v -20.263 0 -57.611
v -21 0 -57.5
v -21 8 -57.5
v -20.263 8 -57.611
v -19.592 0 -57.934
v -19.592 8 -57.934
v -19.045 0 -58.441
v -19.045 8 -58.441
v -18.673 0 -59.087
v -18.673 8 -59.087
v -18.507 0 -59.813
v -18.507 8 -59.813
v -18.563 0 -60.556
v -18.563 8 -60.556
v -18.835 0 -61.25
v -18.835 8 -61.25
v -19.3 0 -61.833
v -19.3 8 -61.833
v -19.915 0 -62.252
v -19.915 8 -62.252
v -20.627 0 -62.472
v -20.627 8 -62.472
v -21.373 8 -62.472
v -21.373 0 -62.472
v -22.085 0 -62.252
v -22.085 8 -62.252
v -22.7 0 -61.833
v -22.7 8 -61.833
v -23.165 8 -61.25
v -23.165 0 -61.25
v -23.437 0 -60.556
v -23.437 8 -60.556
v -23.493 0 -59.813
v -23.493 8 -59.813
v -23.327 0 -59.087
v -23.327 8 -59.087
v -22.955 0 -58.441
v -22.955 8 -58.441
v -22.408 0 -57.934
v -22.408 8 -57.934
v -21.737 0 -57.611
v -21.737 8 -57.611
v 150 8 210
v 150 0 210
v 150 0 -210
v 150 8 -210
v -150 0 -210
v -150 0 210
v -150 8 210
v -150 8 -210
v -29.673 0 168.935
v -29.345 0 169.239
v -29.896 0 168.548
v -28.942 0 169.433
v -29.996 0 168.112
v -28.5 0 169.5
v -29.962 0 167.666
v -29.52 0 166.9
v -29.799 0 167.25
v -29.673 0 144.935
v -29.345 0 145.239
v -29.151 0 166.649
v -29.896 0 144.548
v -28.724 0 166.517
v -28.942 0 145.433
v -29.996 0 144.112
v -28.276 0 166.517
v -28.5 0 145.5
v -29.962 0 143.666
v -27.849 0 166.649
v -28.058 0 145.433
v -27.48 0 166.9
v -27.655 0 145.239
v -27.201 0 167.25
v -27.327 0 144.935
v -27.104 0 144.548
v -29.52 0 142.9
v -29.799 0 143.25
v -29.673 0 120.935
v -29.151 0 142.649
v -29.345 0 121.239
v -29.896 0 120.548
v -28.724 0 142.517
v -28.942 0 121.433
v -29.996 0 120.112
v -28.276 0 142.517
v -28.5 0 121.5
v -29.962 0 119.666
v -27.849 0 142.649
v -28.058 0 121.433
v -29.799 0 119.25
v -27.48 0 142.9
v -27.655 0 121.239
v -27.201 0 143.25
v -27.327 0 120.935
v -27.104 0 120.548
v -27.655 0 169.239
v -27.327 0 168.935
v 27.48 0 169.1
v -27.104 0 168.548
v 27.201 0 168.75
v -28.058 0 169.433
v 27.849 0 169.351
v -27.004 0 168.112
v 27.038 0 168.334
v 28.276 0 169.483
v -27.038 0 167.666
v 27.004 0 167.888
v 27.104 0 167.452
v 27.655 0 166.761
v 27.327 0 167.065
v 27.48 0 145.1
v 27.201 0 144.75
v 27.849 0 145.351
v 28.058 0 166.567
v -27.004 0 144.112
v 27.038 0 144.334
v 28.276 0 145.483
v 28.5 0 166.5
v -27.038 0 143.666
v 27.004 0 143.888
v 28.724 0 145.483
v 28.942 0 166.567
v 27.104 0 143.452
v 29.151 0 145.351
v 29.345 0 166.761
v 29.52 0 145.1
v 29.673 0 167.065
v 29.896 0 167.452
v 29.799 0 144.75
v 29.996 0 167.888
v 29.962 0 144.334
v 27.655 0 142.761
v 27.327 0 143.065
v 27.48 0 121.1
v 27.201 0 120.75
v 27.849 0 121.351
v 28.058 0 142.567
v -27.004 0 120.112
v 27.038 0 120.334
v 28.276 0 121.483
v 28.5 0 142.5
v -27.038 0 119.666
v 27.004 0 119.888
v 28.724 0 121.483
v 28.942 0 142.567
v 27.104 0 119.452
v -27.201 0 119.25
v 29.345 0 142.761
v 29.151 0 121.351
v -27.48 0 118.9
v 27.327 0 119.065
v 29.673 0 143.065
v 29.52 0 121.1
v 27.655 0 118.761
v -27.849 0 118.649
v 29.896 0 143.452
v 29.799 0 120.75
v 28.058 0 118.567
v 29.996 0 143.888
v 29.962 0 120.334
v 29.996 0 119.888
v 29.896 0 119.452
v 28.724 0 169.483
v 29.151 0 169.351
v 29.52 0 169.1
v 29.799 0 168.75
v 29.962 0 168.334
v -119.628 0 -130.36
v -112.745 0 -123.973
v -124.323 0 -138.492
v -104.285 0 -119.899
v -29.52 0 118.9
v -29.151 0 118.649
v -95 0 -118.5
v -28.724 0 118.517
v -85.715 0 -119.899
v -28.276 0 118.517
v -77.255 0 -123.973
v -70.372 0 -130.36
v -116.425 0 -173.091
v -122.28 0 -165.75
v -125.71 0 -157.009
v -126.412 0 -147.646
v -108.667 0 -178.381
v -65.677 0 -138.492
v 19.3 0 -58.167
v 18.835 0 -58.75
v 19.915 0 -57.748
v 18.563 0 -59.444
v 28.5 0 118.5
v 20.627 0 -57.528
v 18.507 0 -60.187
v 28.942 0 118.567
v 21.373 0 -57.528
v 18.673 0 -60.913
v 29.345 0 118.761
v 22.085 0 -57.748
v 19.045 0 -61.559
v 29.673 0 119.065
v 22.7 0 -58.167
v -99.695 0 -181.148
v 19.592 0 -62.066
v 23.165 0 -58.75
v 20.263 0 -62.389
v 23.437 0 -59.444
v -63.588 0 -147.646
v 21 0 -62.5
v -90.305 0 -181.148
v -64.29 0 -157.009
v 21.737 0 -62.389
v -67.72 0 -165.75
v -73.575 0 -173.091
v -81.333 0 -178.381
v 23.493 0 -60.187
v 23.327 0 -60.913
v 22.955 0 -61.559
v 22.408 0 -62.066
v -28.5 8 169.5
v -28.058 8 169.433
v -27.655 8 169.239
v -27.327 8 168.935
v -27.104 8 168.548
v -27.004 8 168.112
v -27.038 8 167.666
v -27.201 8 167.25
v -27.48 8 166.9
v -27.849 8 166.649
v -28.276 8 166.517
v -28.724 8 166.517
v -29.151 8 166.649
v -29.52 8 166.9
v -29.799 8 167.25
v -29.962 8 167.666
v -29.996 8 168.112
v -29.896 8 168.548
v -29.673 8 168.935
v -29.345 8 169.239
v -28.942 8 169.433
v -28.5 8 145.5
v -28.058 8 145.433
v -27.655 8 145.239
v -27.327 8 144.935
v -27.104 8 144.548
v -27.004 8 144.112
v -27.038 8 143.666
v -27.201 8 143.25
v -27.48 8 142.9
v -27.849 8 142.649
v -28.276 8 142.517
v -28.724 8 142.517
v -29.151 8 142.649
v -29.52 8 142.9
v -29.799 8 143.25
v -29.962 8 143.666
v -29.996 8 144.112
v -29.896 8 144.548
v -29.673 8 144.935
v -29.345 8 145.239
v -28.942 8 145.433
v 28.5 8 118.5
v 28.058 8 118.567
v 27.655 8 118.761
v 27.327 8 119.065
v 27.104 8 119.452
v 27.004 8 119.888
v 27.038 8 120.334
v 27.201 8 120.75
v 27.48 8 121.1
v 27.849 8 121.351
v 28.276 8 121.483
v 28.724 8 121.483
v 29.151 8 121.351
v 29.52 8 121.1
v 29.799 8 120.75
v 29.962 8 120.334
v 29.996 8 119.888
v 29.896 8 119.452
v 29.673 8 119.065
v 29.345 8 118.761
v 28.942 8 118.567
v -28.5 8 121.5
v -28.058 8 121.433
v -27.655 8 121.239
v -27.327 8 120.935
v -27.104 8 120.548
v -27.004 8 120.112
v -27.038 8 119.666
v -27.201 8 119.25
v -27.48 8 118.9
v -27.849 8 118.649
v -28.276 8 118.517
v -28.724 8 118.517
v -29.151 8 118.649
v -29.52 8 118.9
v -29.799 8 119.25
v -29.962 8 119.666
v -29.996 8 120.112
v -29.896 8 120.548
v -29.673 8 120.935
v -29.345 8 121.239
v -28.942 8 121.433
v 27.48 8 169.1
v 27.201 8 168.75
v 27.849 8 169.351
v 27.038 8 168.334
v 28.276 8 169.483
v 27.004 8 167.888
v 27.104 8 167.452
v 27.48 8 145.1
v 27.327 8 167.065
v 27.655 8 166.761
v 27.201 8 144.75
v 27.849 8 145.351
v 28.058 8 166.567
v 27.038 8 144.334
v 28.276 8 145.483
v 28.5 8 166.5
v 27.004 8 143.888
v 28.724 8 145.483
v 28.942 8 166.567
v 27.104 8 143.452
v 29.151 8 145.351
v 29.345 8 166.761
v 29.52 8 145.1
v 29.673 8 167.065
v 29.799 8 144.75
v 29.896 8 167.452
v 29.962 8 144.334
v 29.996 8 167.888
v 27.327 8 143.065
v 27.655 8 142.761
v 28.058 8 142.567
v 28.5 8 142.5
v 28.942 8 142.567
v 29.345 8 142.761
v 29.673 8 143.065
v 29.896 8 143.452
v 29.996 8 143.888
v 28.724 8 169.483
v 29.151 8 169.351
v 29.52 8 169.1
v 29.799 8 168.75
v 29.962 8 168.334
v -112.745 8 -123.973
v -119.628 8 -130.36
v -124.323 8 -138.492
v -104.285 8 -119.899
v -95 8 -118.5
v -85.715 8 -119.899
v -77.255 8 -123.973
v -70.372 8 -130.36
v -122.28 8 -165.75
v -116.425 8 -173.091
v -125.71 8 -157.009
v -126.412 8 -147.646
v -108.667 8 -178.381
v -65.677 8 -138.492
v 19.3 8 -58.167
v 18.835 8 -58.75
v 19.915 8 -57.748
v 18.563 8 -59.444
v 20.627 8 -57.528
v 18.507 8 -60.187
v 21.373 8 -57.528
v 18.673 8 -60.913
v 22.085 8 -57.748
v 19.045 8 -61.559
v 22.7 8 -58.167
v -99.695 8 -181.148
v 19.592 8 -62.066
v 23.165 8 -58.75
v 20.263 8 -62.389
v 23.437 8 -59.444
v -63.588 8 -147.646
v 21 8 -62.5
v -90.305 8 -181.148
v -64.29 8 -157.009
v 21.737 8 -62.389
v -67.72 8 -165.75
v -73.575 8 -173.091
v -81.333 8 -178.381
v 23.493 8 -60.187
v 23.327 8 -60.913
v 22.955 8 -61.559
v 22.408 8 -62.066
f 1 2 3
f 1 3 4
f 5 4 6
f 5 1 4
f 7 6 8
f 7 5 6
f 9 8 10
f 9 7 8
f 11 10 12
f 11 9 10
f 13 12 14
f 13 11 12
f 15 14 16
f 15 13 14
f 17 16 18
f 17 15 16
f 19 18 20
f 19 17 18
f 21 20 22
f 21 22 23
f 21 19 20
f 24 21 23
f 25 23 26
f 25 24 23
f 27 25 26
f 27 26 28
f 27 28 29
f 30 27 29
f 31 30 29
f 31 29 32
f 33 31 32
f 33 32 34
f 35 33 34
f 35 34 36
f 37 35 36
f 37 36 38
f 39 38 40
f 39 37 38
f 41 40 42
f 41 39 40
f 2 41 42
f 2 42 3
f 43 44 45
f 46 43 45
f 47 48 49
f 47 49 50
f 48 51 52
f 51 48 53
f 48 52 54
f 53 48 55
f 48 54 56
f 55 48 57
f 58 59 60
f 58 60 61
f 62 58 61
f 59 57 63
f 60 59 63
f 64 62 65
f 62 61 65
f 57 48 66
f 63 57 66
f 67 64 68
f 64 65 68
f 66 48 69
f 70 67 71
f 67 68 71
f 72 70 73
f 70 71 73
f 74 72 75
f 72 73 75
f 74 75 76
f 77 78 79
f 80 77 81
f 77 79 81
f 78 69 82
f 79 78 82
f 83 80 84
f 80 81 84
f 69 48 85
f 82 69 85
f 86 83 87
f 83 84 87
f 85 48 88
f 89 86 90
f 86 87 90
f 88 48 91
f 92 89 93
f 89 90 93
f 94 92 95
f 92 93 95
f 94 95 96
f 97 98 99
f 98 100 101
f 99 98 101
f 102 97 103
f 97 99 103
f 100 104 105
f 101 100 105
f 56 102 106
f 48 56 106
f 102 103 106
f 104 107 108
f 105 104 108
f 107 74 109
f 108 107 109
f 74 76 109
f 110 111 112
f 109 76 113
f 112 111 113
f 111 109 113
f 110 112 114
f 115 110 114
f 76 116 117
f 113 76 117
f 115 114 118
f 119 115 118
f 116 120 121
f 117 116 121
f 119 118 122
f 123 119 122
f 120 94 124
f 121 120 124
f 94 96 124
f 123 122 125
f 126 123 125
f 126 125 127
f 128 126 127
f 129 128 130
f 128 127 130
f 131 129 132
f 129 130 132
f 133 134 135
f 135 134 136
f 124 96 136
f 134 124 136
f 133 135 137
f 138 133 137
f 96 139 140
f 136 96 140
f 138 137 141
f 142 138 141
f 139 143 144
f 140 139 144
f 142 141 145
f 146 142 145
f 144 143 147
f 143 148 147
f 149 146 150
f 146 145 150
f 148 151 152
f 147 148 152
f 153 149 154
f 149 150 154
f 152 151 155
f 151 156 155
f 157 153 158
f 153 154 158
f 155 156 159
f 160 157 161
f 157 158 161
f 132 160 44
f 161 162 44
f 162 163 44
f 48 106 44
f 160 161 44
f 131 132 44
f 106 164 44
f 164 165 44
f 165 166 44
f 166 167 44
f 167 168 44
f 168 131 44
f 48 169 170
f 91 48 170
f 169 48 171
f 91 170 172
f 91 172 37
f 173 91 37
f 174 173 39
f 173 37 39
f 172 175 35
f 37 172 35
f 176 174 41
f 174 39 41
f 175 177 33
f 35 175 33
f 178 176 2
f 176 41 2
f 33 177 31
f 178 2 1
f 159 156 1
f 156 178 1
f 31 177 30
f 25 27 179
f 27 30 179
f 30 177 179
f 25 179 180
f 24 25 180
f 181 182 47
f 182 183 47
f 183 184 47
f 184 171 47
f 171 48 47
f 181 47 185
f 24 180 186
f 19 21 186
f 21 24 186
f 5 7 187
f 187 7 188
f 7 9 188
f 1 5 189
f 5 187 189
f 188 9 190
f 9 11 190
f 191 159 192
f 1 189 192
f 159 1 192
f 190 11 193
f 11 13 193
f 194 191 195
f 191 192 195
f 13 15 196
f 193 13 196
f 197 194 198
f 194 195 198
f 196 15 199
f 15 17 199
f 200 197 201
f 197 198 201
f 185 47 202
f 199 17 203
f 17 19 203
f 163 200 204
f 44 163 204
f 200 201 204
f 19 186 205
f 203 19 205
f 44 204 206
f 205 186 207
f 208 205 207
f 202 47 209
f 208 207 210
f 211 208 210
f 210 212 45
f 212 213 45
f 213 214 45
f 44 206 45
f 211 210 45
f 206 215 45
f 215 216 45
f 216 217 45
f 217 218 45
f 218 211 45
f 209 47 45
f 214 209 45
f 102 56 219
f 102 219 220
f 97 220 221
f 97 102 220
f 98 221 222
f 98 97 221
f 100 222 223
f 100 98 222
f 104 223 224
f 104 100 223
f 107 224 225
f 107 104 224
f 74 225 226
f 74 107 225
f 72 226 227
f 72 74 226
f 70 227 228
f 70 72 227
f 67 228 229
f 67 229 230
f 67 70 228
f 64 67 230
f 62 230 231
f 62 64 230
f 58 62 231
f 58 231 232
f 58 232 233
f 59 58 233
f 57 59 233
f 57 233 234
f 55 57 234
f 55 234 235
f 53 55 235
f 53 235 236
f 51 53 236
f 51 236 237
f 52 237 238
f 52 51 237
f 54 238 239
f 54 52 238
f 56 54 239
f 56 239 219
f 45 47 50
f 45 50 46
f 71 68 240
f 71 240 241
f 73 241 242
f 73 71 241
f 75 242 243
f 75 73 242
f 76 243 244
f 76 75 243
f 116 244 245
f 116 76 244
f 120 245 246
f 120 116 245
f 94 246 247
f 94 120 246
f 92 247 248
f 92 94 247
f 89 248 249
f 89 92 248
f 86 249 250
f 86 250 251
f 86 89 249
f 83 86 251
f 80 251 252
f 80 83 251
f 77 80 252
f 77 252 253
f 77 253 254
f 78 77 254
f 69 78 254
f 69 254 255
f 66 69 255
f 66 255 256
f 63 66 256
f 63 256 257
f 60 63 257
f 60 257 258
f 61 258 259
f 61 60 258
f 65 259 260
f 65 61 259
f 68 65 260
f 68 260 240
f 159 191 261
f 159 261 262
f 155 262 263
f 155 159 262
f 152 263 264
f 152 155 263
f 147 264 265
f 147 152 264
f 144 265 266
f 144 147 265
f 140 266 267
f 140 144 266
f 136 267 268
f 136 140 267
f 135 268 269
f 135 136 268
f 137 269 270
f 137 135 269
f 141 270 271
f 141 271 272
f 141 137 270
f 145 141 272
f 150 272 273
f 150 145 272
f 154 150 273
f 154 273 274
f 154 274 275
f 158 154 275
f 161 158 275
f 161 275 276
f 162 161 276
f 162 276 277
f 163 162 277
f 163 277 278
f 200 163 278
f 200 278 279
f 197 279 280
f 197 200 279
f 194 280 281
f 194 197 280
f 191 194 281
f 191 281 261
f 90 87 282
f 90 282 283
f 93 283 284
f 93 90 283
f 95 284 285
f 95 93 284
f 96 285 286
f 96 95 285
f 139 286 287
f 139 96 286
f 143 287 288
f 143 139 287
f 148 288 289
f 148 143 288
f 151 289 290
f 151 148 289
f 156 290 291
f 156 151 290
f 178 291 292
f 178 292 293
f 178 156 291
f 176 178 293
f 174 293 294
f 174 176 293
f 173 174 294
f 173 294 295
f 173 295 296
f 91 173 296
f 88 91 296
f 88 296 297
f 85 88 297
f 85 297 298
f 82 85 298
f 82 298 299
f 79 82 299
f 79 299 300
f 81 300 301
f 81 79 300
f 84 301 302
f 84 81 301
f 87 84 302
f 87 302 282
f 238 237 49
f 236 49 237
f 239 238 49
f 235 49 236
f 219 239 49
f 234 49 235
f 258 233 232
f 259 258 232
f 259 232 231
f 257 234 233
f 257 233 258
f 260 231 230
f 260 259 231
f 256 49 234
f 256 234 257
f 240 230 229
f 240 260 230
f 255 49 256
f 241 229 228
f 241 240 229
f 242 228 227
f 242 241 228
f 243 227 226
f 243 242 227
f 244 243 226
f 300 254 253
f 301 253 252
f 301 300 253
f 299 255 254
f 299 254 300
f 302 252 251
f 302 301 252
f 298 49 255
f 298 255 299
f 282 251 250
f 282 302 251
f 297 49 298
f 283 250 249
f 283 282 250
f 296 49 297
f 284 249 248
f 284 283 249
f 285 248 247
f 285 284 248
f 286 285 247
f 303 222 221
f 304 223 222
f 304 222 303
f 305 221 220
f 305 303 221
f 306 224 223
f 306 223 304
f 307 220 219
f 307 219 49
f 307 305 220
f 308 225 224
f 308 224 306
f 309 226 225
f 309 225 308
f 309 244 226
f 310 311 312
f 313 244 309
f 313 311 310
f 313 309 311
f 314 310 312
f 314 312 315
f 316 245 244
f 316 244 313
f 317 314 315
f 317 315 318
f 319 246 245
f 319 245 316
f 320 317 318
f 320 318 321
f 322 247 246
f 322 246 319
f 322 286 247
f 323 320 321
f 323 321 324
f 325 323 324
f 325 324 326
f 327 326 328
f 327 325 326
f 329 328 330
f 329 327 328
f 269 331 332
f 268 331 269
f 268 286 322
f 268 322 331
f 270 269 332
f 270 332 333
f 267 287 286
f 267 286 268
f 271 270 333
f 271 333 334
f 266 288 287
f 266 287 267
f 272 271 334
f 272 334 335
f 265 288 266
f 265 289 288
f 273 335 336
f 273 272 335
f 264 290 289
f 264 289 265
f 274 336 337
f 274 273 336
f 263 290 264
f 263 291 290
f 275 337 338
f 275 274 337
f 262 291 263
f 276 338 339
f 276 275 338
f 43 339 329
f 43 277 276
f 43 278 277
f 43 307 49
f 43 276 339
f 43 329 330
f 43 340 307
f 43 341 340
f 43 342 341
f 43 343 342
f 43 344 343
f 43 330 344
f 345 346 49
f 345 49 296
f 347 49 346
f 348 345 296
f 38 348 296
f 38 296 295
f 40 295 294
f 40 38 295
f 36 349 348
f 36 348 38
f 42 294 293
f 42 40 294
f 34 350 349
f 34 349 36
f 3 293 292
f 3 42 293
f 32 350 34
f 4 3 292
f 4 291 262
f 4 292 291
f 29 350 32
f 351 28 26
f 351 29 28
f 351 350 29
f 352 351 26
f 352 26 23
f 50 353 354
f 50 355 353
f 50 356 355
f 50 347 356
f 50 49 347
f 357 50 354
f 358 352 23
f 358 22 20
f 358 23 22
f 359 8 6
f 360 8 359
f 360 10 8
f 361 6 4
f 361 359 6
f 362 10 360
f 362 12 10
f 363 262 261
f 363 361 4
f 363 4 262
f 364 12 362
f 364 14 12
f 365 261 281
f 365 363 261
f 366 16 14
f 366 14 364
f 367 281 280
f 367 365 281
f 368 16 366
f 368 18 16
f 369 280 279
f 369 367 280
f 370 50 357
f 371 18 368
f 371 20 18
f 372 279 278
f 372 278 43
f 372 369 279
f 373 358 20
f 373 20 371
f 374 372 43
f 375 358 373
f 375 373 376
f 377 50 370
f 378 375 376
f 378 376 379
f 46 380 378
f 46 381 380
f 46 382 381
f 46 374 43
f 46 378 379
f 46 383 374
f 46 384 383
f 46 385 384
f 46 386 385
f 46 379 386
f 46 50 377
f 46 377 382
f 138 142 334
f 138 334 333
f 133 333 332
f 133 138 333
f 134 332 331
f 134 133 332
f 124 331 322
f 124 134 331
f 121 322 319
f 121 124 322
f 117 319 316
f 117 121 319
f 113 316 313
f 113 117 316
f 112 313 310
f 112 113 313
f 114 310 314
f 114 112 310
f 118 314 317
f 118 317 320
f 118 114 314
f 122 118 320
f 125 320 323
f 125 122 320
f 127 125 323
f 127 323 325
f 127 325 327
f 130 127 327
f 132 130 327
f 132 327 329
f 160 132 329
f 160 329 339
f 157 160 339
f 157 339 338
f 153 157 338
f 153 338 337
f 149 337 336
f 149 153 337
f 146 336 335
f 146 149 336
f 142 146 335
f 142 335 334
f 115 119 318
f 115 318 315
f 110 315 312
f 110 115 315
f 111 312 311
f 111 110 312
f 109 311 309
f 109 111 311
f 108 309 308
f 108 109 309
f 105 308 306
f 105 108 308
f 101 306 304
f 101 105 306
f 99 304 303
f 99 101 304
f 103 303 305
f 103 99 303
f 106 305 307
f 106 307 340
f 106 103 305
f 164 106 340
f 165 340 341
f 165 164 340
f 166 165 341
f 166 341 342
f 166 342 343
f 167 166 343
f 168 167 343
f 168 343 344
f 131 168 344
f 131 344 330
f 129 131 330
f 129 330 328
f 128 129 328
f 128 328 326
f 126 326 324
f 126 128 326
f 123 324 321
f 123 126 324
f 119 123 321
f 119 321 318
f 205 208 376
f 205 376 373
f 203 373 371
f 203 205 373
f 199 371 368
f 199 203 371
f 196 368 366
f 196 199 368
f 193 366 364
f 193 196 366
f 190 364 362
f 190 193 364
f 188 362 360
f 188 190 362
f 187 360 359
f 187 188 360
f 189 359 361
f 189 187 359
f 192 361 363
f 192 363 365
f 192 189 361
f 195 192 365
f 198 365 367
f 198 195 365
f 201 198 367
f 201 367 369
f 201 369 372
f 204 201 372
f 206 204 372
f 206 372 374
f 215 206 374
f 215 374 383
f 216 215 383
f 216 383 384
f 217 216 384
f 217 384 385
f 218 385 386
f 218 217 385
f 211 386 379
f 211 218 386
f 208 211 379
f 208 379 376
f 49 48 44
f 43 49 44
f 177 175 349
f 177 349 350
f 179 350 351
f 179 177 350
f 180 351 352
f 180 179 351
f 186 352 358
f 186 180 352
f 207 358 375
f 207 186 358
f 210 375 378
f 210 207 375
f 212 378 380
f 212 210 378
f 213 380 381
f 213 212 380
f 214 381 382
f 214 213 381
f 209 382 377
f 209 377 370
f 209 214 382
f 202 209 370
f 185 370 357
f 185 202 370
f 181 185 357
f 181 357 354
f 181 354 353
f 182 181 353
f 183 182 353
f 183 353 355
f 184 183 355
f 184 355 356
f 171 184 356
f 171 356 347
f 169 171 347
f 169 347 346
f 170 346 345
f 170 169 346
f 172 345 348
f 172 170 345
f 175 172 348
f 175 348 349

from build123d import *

# Parameters (mm, degrees)
SKETCH1_W           = 300
SKETCH1_H           = 420
SKETCH1_R           = 2.5
SKETCH1_R_2         = 1.5
SKETCH1_R_3         = 31.5
BOSS_EXTRUDE1_DEPTH = 8


with BuildPart() as part:
    # Sketch1 → Boss-Extrude1 (new body)
    with BuildSketch(Plane(origin=(0, 0, 0), x_dir=(1, 0, 0), z_dir=(0, 1, 0))):
        Rectangle(SKETCH1_W, SKETCH1_H)
        with Locations(Location((-21, 60, 0), (0, 0, 270))):
            Circle(SKETCH1_R, mode=Mode.SUBTRACT)
        with Locations(Location((21, 60, 0), (0, 0, 90))):
            Circle(SKETCH1_R, mode=Mode.SUBTRACT)
        with Locations(Location((-28.5, -120, 0), (0, 0, 270))):
            Circle(SKETCH1_R_2, mode=Mode.SUBTRACT)
        with Locations(Location((-28.5, -144, 0), (0, 0, 270))):
            Circle(SKETCH1_R_2, mode=Mode.SUBTRACT)
        with Locations(Location((-28.5, -168, 0), (0, 0, 270))):
            Circle(SKETCH1_R_2, mode=Mode.SUBTRACT)
        with Locations(Location((28.5, -168, 0), (0, 0, 90))):
            Circle(SKETCH1_R_2, mode=Mode.SUBTRACT)
        with Locations(Location((28.5, -144, 0), (0, 0, 90))):
            Circle(SKETCH1_R_2, mode=Mode.SUBTRACT)
        with Locations(Location((28.5, -120, 0), (0, 0, 90))):
            Circle(SKETCH1_R_2, mode=Mode.SUBTRACT)
        with Locations(Location((-95, 150, 0), (0, 0, 270))):
            Circle(SKETCH1_R_3, mode=Mode.SUBTRACT)
    extrude(amount=BOSS_EXTRUDE1_DEPTH)


solid = part.part
